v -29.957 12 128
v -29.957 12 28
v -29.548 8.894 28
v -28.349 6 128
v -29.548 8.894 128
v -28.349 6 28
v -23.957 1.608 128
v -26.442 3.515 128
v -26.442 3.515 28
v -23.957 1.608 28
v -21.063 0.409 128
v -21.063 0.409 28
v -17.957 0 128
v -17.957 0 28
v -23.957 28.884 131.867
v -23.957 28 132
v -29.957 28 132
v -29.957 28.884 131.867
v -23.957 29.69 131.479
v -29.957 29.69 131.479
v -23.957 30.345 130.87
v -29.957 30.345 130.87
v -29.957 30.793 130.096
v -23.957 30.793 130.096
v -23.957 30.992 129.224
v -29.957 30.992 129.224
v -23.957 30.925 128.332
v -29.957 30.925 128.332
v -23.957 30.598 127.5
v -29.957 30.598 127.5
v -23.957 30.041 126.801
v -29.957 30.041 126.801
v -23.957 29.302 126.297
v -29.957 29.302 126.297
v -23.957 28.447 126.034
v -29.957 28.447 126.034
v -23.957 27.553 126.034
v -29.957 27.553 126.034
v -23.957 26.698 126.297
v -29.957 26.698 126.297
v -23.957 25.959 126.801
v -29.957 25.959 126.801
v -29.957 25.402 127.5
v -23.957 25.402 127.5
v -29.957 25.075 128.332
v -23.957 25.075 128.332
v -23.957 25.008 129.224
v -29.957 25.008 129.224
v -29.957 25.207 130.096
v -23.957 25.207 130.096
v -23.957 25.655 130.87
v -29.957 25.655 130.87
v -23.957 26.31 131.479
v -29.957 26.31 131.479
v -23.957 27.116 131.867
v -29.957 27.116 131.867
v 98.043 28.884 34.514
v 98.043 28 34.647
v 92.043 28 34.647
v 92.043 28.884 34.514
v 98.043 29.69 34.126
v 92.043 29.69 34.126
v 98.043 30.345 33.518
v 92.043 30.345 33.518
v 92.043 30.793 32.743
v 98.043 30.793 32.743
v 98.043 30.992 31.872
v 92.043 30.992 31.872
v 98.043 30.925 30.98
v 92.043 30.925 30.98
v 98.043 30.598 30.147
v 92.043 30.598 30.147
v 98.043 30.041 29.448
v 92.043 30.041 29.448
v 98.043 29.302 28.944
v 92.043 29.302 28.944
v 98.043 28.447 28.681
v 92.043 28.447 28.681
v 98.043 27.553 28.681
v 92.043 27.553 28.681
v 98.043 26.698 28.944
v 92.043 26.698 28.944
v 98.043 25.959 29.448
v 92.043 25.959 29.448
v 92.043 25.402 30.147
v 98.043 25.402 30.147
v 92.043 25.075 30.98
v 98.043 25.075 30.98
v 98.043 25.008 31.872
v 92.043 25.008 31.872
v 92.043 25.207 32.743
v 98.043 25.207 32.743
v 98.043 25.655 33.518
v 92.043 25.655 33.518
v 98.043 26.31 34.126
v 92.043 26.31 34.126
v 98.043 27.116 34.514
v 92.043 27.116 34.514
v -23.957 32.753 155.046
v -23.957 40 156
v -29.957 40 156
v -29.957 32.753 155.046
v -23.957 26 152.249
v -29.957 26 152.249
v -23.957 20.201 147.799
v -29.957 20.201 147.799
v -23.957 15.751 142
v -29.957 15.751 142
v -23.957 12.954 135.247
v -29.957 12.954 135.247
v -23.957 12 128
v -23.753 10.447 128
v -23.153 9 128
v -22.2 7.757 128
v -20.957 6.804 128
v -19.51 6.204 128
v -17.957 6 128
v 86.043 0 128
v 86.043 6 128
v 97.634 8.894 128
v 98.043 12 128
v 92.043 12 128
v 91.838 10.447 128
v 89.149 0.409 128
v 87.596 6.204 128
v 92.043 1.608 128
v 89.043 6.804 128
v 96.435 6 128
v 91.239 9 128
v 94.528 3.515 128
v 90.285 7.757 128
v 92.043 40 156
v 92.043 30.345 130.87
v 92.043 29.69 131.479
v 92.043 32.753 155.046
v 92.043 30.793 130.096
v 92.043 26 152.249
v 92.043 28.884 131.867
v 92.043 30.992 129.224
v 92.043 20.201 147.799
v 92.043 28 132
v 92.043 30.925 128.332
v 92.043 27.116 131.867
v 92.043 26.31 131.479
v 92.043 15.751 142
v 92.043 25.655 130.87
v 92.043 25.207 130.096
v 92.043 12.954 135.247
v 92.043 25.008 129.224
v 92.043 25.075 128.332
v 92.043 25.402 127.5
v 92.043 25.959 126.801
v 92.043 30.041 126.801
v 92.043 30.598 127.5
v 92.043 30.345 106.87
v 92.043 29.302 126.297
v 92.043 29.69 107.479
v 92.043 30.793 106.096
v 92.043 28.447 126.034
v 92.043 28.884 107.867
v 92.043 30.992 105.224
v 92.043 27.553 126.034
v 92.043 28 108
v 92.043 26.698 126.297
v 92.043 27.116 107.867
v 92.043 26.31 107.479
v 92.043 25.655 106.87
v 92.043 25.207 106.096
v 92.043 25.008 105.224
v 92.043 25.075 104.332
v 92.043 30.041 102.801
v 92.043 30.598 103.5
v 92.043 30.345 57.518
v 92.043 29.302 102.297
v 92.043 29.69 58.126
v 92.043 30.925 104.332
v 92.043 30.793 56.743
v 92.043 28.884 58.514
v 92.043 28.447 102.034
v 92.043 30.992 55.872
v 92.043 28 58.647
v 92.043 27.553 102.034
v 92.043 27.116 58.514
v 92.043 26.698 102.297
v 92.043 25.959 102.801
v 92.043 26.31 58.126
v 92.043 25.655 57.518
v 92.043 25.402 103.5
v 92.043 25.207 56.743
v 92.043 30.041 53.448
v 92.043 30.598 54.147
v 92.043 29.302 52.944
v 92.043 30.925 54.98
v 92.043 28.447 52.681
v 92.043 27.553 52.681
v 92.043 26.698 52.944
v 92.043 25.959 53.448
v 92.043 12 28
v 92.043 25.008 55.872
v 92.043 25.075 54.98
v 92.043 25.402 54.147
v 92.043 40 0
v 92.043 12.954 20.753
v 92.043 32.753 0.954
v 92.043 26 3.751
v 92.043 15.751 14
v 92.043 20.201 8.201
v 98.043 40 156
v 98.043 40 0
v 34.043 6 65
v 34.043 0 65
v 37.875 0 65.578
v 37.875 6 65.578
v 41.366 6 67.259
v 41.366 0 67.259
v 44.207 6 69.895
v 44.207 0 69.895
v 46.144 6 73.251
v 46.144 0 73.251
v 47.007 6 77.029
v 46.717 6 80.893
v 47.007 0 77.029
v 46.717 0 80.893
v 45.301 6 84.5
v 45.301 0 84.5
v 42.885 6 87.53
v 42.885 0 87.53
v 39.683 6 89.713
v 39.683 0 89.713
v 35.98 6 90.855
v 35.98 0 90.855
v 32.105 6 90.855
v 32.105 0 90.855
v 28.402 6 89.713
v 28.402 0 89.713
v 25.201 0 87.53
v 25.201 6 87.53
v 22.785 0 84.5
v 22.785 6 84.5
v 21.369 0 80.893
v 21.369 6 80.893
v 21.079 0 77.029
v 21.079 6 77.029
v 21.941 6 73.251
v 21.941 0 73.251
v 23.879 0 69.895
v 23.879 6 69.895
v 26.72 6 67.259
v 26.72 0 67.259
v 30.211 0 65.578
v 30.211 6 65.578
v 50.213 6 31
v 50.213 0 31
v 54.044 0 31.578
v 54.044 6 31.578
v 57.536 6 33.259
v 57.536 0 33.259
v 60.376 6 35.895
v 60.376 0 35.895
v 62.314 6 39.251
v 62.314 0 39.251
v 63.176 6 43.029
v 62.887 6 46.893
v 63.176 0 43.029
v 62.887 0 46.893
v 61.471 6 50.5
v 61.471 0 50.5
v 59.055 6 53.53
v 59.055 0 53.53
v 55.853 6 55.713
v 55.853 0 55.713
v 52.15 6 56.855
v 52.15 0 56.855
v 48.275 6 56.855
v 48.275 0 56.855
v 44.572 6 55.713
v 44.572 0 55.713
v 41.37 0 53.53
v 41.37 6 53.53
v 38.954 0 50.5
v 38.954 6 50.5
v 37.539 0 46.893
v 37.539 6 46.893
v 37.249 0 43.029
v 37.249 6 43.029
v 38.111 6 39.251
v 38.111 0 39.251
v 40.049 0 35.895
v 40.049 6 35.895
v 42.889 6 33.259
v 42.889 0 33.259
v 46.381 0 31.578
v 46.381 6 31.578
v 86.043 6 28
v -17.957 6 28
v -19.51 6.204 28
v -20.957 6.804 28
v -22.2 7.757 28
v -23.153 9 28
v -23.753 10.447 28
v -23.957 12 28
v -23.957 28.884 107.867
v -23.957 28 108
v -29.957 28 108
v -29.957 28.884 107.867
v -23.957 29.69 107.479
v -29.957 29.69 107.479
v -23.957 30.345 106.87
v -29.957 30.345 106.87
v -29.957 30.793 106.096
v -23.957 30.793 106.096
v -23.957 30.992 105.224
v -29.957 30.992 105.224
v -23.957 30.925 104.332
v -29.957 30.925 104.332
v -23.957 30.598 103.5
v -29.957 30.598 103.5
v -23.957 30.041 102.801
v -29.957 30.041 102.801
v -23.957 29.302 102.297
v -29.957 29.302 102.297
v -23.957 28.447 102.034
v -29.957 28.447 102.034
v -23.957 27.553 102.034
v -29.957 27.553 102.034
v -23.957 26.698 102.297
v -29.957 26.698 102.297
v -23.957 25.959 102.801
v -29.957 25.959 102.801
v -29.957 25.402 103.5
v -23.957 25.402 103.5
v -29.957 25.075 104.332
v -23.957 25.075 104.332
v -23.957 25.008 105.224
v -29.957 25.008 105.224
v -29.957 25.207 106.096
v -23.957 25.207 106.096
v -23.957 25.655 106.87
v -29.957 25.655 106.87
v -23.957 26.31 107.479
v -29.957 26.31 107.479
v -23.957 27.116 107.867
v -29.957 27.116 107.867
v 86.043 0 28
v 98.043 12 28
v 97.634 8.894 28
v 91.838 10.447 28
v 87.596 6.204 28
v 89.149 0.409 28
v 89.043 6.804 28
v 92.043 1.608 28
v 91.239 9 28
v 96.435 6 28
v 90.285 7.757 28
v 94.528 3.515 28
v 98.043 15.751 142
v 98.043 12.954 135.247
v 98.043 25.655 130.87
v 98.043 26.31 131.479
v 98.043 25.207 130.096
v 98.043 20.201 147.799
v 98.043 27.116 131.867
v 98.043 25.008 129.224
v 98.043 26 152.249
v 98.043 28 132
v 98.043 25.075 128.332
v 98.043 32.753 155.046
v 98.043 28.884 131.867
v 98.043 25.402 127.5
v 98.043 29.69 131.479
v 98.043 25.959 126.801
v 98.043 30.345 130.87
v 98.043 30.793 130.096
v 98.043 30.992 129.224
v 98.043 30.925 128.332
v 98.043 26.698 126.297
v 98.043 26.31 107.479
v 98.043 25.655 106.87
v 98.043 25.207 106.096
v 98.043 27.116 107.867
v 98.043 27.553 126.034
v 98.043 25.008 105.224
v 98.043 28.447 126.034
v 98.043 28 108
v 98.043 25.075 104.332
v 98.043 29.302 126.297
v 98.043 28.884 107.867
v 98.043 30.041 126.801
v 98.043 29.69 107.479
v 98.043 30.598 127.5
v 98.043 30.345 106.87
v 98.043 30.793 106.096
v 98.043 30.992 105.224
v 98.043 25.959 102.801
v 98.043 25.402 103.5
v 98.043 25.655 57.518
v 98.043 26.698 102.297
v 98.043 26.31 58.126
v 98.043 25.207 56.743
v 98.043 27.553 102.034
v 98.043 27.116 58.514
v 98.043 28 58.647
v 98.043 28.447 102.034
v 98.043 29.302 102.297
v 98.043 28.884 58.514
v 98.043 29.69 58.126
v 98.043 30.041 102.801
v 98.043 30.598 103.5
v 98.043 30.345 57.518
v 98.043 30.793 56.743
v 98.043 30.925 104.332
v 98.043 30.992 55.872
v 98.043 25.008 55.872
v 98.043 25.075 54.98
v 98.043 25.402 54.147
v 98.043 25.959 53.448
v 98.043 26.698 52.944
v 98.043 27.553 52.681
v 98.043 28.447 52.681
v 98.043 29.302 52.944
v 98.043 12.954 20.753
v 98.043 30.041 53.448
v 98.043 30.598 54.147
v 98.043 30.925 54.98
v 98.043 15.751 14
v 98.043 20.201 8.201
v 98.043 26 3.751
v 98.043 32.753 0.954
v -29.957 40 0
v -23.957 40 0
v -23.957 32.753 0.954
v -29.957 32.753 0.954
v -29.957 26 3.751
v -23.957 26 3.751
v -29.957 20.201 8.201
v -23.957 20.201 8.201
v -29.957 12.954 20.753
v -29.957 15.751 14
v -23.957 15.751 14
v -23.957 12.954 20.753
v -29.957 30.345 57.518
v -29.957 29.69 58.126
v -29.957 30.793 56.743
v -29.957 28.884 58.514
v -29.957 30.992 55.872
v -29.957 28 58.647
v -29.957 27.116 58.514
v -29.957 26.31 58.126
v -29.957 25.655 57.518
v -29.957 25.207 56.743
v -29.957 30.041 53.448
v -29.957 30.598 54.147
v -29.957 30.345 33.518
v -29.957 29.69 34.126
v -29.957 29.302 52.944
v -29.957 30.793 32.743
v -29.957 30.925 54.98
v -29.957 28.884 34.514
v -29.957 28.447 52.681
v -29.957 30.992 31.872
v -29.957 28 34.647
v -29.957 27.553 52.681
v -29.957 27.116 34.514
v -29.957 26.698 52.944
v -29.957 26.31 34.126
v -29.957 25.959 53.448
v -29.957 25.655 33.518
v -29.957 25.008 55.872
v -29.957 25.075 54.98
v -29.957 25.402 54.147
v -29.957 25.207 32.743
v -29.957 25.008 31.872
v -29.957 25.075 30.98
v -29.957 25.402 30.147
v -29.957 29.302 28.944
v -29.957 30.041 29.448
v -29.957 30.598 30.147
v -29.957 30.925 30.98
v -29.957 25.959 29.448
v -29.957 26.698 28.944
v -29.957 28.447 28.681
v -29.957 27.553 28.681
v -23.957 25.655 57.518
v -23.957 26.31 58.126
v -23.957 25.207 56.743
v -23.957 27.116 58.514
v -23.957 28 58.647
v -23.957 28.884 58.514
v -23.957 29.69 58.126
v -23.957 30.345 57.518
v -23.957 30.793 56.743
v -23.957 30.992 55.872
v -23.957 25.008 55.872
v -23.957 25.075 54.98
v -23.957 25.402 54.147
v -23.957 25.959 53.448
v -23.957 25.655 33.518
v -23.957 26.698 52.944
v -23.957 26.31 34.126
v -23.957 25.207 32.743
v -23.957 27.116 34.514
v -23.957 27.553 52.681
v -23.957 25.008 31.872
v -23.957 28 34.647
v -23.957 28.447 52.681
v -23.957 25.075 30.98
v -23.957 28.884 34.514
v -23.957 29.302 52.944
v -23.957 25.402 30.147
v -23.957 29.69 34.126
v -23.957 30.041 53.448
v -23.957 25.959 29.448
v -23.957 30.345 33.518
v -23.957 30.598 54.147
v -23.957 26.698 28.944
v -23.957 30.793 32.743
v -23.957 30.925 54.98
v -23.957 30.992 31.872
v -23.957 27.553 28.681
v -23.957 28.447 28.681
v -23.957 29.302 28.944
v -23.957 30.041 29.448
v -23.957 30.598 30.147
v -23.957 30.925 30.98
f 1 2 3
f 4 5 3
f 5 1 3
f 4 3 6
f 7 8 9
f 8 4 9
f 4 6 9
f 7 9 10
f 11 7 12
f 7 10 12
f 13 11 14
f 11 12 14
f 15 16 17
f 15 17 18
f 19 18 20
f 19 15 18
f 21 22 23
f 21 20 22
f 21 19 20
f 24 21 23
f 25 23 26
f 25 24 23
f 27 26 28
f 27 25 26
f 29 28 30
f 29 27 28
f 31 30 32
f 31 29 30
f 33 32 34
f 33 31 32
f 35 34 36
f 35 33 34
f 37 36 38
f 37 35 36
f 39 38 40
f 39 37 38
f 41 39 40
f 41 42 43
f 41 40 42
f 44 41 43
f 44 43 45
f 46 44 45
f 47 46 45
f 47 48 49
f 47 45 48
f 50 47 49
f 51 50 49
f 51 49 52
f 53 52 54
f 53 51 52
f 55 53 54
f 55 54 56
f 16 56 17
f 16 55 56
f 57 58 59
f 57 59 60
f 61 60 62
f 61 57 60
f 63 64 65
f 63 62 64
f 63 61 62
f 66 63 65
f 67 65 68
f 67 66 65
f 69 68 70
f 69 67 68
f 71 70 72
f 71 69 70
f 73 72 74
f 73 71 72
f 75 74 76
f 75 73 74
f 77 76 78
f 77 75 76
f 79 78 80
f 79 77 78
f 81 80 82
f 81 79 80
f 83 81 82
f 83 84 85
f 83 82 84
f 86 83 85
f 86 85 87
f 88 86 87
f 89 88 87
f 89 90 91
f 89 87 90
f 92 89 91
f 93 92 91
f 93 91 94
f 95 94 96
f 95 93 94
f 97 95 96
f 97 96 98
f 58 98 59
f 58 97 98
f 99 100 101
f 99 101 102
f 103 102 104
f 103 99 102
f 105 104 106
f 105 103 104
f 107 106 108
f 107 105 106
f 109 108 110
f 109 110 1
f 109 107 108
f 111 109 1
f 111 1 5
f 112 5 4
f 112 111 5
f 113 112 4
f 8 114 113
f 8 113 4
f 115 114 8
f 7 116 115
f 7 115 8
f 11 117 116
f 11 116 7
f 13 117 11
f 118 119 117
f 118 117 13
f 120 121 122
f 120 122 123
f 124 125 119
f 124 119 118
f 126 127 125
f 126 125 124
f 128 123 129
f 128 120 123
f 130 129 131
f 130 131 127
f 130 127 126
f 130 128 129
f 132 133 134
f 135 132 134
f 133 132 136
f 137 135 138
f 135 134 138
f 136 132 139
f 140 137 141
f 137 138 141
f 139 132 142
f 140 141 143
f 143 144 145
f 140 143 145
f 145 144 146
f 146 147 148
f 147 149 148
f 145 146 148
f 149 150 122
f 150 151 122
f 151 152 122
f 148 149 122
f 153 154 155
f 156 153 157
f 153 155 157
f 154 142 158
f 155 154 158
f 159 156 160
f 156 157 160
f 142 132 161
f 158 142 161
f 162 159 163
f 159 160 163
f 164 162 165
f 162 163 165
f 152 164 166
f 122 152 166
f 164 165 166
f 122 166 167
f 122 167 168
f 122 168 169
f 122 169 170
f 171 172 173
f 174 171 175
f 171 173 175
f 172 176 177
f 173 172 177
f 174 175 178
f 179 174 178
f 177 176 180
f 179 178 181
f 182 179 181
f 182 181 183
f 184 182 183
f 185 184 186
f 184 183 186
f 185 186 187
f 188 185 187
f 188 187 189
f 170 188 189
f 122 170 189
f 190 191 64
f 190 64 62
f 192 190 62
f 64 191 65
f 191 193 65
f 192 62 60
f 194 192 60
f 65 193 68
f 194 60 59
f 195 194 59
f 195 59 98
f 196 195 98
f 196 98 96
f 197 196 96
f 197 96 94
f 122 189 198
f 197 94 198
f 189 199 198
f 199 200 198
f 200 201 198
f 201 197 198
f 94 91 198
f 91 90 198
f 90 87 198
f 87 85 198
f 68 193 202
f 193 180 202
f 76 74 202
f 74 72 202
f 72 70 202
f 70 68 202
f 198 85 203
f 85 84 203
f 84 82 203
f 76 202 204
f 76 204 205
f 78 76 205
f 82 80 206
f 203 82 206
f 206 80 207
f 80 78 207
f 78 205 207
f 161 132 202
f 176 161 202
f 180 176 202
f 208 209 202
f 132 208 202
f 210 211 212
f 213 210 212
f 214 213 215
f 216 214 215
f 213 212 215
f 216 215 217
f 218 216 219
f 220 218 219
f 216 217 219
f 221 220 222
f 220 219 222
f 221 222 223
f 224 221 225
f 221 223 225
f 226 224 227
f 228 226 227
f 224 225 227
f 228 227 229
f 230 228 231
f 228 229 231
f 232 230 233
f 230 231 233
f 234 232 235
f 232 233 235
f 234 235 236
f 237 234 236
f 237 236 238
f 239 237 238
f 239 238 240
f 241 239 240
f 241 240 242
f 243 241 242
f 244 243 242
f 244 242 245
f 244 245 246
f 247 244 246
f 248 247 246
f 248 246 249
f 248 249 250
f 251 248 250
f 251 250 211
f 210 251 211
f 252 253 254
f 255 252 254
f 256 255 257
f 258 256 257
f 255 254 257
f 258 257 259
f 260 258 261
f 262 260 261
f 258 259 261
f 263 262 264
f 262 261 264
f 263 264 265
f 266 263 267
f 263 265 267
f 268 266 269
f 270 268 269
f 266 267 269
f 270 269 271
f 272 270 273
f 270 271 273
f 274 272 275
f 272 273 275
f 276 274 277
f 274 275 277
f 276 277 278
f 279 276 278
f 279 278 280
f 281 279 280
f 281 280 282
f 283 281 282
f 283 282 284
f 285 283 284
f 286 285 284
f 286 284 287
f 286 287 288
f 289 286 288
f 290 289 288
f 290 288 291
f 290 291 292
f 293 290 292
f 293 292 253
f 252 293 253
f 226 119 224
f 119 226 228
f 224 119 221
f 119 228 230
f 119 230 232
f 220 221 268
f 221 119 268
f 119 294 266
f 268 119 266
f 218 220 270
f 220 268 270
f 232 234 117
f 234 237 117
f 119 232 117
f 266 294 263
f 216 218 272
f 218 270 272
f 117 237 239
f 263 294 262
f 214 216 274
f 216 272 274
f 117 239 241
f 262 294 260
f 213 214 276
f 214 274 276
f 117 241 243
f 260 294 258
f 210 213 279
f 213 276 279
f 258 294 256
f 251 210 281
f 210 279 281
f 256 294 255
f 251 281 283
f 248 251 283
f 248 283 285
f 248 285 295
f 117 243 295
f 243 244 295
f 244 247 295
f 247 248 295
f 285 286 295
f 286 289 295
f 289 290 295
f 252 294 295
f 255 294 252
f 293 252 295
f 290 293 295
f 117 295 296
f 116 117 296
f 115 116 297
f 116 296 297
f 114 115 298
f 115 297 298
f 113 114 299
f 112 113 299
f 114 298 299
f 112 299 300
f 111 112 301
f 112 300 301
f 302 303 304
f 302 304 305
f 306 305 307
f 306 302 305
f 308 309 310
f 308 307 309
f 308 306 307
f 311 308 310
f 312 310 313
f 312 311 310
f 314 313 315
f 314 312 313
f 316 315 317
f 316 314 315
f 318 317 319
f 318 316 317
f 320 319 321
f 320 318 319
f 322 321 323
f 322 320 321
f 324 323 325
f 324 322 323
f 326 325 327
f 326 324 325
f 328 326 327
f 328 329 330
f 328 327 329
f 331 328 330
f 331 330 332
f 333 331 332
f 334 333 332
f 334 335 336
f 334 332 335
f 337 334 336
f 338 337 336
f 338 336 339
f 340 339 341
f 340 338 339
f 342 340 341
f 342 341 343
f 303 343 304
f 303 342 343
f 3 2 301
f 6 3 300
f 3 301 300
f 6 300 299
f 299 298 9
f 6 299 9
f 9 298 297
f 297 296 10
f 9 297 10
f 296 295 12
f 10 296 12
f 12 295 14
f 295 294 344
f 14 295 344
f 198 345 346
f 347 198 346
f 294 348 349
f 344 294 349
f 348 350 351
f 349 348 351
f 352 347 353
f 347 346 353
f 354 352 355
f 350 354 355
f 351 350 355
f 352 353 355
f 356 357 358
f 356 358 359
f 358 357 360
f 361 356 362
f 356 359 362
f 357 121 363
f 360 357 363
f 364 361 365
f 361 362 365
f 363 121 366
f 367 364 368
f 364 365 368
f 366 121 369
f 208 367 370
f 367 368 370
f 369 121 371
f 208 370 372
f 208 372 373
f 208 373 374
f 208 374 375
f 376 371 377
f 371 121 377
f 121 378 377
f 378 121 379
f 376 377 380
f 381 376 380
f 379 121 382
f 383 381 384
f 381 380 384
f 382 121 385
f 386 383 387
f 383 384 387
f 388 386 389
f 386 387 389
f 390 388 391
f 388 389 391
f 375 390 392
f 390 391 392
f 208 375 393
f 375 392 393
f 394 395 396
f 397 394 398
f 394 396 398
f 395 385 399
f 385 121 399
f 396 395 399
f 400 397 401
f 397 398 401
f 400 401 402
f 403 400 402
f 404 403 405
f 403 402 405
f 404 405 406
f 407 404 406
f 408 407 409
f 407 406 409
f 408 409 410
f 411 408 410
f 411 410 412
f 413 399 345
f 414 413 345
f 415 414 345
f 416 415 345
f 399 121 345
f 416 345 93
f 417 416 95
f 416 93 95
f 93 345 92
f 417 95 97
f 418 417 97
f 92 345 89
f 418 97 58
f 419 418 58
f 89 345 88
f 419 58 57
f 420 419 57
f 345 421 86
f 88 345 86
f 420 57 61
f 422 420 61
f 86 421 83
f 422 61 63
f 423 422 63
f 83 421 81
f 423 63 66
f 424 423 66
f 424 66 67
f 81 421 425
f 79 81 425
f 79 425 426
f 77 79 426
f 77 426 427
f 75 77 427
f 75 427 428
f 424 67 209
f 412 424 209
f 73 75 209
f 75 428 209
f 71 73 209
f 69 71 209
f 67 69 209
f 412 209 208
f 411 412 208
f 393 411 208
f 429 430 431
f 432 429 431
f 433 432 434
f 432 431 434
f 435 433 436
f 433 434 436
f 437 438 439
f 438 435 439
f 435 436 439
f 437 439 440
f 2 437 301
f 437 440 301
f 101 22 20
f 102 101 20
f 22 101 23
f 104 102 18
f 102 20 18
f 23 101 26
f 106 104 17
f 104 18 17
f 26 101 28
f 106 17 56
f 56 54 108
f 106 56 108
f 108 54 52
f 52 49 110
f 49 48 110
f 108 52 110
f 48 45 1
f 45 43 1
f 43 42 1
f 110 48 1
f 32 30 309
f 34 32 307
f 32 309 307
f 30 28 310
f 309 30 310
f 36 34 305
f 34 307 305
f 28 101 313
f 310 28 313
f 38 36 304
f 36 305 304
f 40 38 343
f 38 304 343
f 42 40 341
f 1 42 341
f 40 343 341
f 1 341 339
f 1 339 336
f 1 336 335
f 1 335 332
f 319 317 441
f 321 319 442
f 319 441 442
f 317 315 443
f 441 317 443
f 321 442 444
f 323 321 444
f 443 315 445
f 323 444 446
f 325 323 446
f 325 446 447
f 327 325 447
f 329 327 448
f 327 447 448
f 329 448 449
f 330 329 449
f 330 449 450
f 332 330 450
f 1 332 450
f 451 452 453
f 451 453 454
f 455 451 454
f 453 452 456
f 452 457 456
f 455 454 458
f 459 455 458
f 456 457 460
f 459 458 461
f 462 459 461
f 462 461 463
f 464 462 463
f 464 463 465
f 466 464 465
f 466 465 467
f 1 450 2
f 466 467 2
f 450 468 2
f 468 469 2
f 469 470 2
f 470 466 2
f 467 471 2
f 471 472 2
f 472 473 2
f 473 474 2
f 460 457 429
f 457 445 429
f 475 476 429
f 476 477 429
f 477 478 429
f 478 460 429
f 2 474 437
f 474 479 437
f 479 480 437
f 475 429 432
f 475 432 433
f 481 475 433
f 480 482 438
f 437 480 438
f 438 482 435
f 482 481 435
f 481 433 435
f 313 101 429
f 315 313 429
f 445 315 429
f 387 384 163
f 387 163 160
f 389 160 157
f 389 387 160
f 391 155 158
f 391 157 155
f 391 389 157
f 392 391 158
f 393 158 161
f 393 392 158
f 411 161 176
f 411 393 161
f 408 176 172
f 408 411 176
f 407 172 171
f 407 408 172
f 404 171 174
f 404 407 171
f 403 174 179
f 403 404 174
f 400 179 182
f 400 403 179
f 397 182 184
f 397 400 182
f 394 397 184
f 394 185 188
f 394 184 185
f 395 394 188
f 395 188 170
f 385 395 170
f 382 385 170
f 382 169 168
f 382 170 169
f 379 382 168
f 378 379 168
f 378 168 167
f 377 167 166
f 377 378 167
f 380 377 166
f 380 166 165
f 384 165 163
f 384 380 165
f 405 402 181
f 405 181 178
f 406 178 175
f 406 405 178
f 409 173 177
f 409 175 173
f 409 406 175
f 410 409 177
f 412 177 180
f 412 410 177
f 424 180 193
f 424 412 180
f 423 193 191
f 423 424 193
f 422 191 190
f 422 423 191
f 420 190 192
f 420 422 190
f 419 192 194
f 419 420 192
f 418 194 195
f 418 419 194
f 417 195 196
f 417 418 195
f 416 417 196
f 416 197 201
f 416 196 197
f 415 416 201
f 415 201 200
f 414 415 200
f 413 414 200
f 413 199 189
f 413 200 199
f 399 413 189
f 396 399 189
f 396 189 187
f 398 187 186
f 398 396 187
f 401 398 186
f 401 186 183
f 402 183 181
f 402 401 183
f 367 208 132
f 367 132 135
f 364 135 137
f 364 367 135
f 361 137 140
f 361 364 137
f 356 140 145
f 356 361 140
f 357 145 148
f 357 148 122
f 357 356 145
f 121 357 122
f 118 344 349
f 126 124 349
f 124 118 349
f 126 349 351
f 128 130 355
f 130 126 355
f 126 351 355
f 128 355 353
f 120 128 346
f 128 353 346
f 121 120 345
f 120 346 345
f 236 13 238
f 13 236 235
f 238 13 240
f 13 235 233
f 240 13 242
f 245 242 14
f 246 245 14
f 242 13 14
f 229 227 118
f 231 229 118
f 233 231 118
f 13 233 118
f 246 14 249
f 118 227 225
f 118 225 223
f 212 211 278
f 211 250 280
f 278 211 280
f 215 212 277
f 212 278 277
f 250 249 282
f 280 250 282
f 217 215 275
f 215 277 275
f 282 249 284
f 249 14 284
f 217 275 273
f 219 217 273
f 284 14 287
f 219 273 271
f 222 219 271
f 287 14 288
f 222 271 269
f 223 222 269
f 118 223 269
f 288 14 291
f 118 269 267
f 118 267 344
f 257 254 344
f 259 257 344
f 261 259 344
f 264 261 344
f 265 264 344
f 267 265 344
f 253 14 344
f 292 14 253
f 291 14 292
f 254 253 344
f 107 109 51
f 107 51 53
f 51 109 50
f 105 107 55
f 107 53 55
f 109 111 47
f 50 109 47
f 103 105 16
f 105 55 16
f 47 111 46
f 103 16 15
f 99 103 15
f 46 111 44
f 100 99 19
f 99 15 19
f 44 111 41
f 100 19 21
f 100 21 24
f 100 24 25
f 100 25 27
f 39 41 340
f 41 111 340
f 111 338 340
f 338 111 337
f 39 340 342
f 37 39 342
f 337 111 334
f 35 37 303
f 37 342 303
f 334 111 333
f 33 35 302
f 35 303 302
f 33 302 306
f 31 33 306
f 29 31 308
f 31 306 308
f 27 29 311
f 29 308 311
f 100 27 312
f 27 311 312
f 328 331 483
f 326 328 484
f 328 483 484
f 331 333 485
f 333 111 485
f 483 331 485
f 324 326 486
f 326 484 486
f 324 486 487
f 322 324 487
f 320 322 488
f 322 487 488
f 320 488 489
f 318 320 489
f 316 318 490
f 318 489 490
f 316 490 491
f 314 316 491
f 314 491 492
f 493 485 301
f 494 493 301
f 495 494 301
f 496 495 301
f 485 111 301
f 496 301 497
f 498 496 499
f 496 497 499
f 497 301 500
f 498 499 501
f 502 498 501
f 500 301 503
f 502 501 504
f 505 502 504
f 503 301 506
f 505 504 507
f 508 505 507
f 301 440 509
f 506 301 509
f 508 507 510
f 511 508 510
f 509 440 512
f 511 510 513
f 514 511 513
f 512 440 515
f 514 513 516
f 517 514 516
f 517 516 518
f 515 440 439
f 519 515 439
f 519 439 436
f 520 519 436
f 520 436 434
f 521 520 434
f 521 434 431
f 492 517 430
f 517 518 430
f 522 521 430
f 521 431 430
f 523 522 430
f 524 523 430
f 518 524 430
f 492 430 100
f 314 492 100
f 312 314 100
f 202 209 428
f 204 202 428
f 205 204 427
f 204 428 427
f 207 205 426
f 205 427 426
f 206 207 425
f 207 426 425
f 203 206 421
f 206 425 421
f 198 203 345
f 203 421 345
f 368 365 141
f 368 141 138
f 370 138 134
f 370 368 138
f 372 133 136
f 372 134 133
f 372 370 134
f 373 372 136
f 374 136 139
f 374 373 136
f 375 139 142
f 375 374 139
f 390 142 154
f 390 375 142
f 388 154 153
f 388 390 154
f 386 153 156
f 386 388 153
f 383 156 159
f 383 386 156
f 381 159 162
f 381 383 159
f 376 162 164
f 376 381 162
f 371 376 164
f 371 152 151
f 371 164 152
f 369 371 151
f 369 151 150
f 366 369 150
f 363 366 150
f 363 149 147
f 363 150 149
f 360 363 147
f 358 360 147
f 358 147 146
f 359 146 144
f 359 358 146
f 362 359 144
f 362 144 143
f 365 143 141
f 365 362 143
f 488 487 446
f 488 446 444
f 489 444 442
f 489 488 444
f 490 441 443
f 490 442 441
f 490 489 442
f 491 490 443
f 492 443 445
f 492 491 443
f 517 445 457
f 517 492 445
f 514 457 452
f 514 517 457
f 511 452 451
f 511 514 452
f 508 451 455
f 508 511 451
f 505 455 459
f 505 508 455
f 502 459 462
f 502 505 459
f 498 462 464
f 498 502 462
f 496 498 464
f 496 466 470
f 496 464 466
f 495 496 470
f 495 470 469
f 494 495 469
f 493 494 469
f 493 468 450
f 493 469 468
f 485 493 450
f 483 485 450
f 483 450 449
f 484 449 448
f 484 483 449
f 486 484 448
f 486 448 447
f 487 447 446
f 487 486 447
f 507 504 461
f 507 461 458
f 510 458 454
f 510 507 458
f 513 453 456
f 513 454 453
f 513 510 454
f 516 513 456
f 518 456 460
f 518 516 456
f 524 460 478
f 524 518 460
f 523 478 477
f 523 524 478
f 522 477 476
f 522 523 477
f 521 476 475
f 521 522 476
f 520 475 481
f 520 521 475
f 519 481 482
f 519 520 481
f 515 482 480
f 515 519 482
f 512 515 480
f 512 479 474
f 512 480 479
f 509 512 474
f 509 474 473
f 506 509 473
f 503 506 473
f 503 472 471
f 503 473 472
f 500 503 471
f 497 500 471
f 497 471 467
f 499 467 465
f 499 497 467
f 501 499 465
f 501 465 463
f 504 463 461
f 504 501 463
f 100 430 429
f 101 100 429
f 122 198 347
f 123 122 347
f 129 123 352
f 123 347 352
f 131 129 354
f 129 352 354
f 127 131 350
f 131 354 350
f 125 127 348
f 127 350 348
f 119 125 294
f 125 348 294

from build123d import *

# Parameters (mm, degrees)
BASE_FLANGE1_DEPTH      = 156
CUT_EXTRUDE1_DEPTH      = 206.71825393
SKETCH6_R               = 13
CUT_EXTRUDE2_DEPTH      = 10
CUT_EXTRUDE3_DEPTH      = 203.039600079
CUT_EXTRUDE3_DEPTH_BACK = 203.039600079
SKETCH7_R               = 3


# Sheet-metal steps are written as plain solids
with BuildPart() as part:
    # Sketch2 → Base-Flange1 (new body)
    with BuildSketch(Plane.XY):
        with BuildLine():
            Line((-29.957142857, 40), (-29.957142857, 12))
            ThreePointArc((-29.957142857, 12), (-26.442424231, 3.514718626), (-17.957142857, 0))
            Line((-17.957142857, 0), (86.042857143, 0))
            ThreePointArc((86.042857143, 0), (94.528138517, 3.514718626), (98.042857143, 12))
            Line((98.042857143, 12), (98.042857143, 40))
            Line((98.042857143, 40), (92.042857143, 40))
            Line((92.042857143, 40), (92.042857143, 12))
            ThreePointArc((92.042857143, 12), (90.28549783, 7.757359313), (86.042857143, 6))
            Line((86.042857143, 6), (-17.957142857, 6))
            ThreePointArc((-17.957142857, 6), (-22.199783544, 7.757359313), (-23.957142857, 12))
            Line((-23.957142857, 12), (-23.957142857, 40))
            Line((-23.957142857, 40), (-29.957142857, 40))
        make_face()
    extrude(amount=BASE_FLANGE1_DEPTH)

    # Sketch5 → Cut-Extrude1 (cut, through all)
    with BuildSketch(Plane(origin=(98.042857143, 0, 0), x_dir=(0, 0, -1), z_dir=(1, 0, 0))):
        with BuildLine():
            Line((-128, 12), (-128, 0))
            Line((-128, 0), (-156, 0))
            Line((-156, 0), (-156, 40))
            ThreePointArc((-156, 40), (-147.798989873, 20.201010127), (-128, 12))
        make_face()
        with BuildLine():
            Line((0, 0), (0, 40))
            ThreePointArc((0, 40), (-8.201010127, 20.201010127), (-28, 12))
            Line((-28, 12), (-28, 0))
            Line((-28, 0), (0, 0))
        make_face()
    extrude(amount=-CUT_EXTRUDE1_DEPTH, mode=Mode.SUBTRACT)

    # Sketch6 → Cut-Extrude2 (cut)
    with BuildSketch(Plane.XZ):
        with Locations(Location((34.042857143, 78, 0), (0, 0, 270))):
            Circle(SKETCH6_R)
        with Locations(Location((50.212608526, 44, 0), (0, 0, 270))):
            Circle(SKETCH6_R)
    extrude(amount=-CUT_EXTRUDE2_DEPTH, mode=Mode.SUBTRACT)

    # Sketch7 → Cut-Extrude3 (cut, two sides: drawn at the far end of the back side and taken through both)
    with BuildSketch(Plane.ZY.offset(-92.042857143).offset(-CUT_EXTRUDE3_DEPTH_BACK)):
        with Locations((31.647353532, 28)):
            Circle(SKETCH7_R)
        with Locations((55.647353532, 28)):
            Circle(SKETCH7_R)
        with Locations((105, 28)):
            Circle(SKETCH7_R)
        with Locations((129, 28)):
            Circle(SKETCH7_R)
    extrude(amount=CUT_EXTRUDE3_DEPTH + CUT_EXTRUDE3_DEPTH_BACK, mode=Mode.SUBTRACT)


solid = part.part
